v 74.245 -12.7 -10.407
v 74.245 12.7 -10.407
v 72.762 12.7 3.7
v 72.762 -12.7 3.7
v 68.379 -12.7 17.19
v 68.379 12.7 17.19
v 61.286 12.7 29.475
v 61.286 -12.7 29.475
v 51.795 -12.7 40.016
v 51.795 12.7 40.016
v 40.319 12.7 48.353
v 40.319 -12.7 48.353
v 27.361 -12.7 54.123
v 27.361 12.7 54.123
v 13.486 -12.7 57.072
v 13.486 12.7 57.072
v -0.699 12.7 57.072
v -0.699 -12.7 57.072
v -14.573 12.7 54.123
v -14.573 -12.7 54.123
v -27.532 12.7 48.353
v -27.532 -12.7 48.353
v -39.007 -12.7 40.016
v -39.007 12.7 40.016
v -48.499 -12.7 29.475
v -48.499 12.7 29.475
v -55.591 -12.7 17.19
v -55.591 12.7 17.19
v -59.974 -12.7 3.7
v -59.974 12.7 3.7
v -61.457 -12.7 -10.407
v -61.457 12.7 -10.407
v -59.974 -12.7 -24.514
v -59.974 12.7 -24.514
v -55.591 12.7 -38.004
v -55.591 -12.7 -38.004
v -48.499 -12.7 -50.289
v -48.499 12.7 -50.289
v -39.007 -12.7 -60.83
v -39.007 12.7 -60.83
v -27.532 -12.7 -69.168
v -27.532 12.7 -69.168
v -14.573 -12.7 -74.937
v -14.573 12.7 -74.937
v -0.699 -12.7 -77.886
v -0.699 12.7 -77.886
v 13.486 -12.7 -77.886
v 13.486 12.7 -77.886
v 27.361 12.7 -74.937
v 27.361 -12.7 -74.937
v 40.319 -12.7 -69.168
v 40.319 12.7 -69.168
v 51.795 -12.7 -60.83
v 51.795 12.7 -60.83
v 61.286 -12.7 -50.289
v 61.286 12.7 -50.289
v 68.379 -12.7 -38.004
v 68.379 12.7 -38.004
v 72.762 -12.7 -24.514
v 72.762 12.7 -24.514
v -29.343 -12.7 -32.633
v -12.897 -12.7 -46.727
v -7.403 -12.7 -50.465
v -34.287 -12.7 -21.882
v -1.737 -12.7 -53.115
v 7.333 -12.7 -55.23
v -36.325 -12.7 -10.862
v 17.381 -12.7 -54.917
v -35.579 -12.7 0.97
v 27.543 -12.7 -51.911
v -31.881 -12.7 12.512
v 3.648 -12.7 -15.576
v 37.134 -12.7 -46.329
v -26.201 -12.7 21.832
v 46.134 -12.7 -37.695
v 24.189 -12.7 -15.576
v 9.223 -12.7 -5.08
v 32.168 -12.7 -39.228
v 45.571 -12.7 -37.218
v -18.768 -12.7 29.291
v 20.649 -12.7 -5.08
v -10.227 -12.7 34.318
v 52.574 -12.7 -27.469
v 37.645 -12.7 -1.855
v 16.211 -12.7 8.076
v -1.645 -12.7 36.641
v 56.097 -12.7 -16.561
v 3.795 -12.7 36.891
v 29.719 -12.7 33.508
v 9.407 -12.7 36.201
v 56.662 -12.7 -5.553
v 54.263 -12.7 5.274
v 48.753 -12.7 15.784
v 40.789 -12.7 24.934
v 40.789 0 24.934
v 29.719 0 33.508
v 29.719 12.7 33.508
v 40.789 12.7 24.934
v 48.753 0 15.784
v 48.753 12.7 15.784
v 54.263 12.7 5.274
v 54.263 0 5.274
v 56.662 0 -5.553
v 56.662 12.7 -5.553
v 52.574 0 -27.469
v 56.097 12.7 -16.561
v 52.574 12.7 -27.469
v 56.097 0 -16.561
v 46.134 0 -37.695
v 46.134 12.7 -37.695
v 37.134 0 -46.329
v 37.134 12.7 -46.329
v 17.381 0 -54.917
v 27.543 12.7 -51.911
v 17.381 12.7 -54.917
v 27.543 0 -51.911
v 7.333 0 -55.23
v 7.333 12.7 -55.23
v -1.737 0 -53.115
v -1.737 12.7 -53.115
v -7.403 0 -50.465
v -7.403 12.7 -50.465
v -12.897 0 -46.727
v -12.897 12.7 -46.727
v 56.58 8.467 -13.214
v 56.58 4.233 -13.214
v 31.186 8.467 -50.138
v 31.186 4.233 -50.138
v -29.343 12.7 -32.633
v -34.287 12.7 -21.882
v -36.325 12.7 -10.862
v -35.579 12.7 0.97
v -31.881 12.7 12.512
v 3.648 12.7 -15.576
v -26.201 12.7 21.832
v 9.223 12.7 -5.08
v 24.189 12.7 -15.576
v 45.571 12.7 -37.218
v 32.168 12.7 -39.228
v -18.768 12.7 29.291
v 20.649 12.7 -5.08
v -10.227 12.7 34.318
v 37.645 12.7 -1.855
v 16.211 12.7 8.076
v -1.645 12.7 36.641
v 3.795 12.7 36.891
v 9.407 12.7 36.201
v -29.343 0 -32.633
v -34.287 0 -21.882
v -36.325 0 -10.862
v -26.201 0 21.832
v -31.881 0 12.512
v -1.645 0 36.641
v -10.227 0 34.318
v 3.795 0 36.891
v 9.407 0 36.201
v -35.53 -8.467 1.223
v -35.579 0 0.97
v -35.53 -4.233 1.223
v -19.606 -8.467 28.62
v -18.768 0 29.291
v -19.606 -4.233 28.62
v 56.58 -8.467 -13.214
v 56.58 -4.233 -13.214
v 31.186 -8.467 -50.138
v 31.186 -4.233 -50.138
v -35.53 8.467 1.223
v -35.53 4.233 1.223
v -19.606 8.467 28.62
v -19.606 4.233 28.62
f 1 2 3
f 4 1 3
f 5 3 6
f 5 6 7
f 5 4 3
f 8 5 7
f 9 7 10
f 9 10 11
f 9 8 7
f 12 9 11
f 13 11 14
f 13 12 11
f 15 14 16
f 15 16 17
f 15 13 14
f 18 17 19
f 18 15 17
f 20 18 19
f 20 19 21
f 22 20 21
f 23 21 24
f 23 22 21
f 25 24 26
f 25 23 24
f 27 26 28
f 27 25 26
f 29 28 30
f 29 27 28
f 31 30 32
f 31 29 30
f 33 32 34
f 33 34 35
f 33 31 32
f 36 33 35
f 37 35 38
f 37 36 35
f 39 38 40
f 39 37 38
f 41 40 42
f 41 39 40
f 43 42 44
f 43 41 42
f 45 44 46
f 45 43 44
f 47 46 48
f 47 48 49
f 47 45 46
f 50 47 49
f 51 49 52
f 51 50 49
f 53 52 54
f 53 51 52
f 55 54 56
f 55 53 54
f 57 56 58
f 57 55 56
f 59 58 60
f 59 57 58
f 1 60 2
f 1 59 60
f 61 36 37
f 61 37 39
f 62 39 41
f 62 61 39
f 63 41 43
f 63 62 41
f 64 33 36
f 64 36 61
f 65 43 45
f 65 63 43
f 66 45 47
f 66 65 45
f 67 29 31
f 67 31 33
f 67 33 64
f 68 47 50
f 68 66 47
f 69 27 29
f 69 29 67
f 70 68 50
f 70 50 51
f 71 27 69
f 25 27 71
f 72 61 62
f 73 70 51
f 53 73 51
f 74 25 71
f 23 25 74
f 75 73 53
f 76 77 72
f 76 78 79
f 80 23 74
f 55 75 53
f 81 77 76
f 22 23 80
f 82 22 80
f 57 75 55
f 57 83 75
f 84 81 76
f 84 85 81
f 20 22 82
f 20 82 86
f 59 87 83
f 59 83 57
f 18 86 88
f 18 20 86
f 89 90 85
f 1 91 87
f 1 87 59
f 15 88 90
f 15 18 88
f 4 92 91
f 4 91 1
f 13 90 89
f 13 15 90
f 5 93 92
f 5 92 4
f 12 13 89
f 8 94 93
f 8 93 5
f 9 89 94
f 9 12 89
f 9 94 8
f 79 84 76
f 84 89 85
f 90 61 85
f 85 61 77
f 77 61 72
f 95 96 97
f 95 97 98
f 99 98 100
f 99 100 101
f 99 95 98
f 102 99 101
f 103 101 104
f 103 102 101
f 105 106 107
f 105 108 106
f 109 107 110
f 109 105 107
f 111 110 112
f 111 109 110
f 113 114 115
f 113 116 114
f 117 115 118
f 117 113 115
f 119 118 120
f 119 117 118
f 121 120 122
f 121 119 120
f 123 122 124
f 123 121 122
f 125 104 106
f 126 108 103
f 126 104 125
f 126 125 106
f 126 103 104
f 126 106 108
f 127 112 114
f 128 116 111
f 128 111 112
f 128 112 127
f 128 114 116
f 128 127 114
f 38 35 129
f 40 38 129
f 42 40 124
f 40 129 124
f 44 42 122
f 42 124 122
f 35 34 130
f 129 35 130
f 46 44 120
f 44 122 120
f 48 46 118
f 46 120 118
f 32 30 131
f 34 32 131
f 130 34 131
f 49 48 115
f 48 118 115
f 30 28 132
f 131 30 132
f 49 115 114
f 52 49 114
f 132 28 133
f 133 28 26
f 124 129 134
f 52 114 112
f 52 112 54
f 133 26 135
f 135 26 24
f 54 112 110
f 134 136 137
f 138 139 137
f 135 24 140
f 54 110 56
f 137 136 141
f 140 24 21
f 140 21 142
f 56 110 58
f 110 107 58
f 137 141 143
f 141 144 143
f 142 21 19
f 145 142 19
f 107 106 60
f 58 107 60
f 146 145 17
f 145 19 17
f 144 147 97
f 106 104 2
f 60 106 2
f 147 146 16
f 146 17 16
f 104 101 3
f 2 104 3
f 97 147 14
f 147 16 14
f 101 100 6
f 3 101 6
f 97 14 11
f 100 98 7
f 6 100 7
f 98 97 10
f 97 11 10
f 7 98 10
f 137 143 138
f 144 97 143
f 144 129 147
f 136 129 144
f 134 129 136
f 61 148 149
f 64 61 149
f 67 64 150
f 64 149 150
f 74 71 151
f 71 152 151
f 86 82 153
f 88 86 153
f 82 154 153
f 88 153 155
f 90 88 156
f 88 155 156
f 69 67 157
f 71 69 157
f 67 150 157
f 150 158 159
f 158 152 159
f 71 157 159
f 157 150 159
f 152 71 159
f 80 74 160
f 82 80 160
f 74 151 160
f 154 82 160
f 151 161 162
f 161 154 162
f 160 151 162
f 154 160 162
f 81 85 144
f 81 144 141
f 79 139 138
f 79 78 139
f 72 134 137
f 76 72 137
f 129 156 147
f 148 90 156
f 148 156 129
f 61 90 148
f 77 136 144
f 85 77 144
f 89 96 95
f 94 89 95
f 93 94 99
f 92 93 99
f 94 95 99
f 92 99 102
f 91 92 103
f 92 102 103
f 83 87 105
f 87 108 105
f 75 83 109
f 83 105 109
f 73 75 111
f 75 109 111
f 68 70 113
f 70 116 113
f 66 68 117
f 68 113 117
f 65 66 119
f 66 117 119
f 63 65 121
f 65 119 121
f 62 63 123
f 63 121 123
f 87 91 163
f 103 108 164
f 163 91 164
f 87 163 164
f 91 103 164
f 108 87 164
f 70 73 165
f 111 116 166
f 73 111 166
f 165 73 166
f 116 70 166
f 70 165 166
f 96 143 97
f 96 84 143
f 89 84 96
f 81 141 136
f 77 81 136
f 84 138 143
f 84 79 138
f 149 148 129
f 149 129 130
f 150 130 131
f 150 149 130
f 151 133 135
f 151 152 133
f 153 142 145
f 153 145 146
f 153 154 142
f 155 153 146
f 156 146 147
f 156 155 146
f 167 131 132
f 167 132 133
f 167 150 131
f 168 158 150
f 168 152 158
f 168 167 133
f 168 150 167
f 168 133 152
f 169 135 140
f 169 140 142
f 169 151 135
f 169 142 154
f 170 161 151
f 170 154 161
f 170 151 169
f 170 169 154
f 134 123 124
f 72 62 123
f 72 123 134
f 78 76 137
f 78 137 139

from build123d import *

# Parameters (mm, degrees)
F0_R     = 67.8507584939
F1_DEPTH = 12.7
F2_DEPTH = 12.7
F3_DEPTH = 12.7


# Not quite as in the source:
# - a feature of the source that left no trace in its solid (it failed there, or was rolled back) is left out


with BuildPart() as f1:
    # F0 (on Front) → F1 (new body, symmetric)
    with BuildSketch(Plane.XZ):
        with Locations((6.3937897791, -10.4070244153)):
            Circle(F0_R)
        with BuildLine():
            Line((16.2108500706, 8.0759122229), (29.7189755197, 33.5081515453))
            add(Edge.make_bspline(
                [(29.7189755197, 33.5081515453), (93.8960388303, -7.9348757863), (29.3413570435, -80.48370842), (-12.8972016539, -46.7268759549)],
                knots=[0, 0, 0, 0, 90.8504165915, 90.8504165915, 90.8504165915, 90.8504165915], degree=3))
            Line((-12.8972016539, -46.7268759549), (3.6481818786, -15.5762803179))
            Line((3.6481818786, -15.5762803179), (9.2231951319, -5.08))
            Line((9.2231951319, -5.08), (16.2108500706, 8.0759122229))
        make_face(mode=Mode.SUBTRACT)
        with BuildLine():
            Line((9.4068207245, 36.2007932827), (-29.3430900942, -32.6330686977))
            add(Edge.make_bspline(
                [(-29.3430900942, -32.6330686977), (-49.592975527, 0), (-23.1433883309, 42.9805777967), (9.4068207245, 36.2007932827)],
                knots=[0, 0, 0, 0, 78.9914941218, 78.9914941218, 78.9914941218, 78.9914941218], degree=3))
        make_face(mode=Mode.SUBTRACT)
    extrude(amount=F1_DEPTH, both=True)

    # F0 (on Front) → F2 (join, symmetric)
    with BuildSketch(Plane.XZ):
        Polygon((37.6452035187, -1.8549078334), (29.7189755197, 33.5081515453), (16.2108500706, 8.0759122229), (20.6487422011, -5.08), (24.1894590312, -15.5762803179), (32.1680679917, -39.2284728587), (45.5714315176, -37.2179672122), align=None)
    extrude(amount=F2_DEPTH, both=True)

    # F0 (on Front) → F3 (join, symmetric)
    with BuildSketch(Plane.XZ):
        Polygon((20.6487422011, -5.08), (9.2231951319, -5.08), (3.6481818786, -15.5762803179), (24.1894590312, -15.5762803179), align=None)
    extrude(amount=F3_DEPTH, both=True)


solid = f1.part
